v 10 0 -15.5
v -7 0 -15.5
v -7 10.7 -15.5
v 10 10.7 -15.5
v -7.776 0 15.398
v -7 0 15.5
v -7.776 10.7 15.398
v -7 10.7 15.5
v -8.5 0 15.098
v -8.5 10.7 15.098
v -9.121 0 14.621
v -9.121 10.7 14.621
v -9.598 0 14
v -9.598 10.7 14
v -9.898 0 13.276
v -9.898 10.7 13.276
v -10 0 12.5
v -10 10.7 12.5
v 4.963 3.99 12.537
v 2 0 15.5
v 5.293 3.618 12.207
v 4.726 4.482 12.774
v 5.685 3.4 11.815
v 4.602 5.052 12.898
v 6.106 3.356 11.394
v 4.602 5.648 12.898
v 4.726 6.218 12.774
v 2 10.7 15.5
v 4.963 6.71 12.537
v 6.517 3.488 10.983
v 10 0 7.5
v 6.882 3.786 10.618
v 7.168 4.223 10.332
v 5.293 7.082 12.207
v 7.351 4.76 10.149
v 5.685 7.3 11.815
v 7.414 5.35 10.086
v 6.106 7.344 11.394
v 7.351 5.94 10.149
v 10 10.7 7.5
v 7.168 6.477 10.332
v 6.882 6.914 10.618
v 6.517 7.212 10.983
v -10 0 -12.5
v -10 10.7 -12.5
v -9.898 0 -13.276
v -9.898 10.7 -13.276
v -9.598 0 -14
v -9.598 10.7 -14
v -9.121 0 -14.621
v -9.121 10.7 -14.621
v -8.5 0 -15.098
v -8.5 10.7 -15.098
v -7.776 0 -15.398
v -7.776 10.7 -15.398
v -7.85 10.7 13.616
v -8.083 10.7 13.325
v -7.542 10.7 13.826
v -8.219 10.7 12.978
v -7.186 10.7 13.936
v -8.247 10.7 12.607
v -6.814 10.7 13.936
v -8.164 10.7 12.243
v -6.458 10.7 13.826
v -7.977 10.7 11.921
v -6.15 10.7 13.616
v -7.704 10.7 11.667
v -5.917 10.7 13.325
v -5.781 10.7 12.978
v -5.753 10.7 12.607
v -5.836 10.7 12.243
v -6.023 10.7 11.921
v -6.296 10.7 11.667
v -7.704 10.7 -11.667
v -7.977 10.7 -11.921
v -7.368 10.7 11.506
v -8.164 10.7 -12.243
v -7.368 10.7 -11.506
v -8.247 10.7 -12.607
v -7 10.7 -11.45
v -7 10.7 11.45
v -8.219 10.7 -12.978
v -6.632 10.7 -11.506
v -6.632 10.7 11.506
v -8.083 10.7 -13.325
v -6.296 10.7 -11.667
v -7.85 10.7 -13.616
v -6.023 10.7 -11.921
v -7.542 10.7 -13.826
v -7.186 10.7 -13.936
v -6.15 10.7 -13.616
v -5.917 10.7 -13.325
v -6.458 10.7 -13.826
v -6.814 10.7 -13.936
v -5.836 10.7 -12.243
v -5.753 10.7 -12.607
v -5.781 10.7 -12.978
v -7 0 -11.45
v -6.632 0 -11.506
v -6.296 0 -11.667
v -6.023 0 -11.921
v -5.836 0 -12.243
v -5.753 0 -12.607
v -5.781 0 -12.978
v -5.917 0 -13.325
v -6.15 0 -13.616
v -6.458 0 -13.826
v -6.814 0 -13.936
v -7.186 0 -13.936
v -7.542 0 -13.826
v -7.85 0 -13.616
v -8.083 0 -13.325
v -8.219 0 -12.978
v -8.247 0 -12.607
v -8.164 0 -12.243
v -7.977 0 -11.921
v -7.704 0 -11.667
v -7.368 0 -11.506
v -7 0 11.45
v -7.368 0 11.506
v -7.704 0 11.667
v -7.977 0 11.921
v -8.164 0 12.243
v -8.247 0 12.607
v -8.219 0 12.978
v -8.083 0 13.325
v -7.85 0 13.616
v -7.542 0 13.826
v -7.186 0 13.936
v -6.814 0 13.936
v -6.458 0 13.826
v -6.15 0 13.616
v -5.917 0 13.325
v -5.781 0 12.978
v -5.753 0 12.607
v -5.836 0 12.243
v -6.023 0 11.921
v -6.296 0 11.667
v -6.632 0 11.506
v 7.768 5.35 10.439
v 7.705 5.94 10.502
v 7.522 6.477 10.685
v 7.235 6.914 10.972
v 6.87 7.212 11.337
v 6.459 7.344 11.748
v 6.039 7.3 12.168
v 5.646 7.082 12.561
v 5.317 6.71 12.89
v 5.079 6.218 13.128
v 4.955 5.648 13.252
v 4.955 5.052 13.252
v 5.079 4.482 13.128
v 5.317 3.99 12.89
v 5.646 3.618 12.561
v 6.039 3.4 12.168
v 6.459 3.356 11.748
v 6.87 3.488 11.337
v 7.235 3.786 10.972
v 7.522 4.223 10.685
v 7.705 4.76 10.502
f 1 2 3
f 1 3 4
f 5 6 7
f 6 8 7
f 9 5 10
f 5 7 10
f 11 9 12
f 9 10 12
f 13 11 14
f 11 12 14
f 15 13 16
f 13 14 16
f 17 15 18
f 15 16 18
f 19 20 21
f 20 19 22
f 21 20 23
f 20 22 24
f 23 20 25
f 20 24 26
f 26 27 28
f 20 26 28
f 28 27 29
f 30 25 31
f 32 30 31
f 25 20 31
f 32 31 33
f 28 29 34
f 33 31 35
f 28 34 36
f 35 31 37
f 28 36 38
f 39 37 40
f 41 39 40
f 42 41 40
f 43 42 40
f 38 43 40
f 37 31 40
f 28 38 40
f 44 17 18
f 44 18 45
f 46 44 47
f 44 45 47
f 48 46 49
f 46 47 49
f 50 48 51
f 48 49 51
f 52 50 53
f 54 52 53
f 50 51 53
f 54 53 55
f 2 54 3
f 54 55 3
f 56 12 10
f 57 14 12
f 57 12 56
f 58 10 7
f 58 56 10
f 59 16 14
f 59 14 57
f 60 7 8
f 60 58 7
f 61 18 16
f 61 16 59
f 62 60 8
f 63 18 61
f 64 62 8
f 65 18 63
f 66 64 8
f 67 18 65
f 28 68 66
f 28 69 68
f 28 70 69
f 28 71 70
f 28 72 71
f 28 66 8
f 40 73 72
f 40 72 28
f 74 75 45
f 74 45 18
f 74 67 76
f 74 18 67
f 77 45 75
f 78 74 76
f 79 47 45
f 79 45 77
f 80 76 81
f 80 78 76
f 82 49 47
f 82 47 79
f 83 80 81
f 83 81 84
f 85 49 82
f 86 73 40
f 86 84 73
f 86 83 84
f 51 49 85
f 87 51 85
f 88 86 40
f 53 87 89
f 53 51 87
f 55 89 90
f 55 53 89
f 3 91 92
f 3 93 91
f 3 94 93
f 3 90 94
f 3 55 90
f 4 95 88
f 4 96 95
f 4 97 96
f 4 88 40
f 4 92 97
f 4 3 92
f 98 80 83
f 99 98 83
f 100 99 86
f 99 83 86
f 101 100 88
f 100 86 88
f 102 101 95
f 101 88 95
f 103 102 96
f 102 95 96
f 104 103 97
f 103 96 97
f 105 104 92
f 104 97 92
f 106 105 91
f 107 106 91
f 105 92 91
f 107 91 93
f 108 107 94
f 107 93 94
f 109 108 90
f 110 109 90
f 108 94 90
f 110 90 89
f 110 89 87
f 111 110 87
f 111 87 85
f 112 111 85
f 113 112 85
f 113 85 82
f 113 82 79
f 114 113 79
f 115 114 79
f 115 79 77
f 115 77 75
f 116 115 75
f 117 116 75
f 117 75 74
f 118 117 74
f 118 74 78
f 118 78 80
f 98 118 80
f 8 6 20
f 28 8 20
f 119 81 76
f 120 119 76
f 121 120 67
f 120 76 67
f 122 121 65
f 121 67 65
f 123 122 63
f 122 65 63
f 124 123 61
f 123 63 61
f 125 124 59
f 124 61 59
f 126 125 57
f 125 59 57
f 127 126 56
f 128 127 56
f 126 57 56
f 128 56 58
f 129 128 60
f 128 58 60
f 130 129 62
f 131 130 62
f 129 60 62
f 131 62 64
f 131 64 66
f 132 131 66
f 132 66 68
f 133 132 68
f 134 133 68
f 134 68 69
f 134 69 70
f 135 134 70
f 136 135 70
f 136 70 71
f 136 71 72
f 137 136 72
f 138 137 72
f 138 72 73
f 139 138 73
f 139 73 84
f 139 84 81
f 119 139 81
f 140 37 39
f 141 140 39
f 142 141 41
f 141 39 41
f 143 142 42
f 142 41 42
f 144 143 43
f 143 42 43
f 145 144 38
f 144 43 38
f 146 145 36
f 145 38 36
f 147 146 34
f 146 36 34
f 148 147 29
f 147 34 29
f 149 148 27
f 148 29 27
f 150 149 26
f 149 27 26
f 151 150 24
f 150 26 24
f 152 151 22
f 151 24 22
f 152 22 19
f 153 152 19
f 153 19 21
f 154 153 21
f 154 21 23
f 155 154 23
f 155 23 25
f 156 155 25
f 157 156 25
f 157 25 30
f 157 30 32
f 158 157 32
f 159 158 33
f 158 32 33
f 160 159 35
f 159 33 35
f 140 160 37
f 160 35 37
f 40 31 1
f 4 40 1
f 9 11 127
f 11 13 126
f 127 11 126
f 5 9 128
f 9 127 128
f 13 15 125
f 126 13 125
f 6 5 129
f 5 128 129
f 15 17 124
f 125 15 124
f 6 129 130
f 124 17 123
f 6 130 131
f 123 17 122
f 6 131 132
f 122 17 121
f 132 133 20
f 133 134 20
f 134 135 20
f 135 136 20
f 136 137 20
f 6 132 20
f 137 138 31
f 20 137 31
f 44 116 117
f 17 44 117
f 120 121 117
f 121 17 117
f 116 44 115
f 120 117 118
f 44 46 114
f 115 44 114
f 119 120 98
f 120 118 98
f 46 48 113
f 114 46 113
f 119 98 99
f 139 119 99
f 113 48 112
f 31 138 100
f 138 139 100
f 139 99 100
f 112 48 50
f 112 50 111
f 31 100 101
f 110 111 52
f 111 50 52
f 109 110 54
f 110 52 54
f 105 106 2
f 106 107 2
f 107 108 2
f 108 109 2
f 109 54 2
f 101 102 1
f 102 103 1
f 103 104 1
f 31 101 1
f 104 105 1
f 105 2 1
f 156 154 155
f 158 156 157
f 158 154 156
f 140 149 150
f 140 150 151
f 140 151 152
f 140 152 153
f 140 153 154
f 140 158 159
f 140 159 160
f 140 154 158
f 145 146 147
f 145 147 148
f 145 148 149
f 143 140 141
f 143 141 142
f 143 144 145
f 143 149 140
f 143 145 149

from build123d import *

# Parameters (mm, degrees)
SKETCH_1_W          = 20
SKETCH_1_H          = 31
EXTRUDE_1_DEPTH     = 10.7
SKETCH_2_R          = 1.25
CUT_EXTRUDE_1_DEPTH = 40.7
CHAMFER_1_SIZE      = 8
SKETCH_3_R          = 2
EXTRUDE_2_DEPTH     = 0.5
FILLET_1_R          = 3


with BuildPart() as part:
    # 草图1 → 凸台-拉伸1 (new body)
    with BuildSketch(Plane(origin=(0, 0, 0), x_dir=(1, 0, 0), z_dir=(0, 1, 0))):
        Rectangle(SKETCH_1_W, SKETCH_1_H)
    extrude(amount=EXTRUDE_1_DEPTH)

    # 草图2 → 切除-拉伸1 (cut)
    with BuildSketch(Plane(origin=(0, 10.7, 0), x_dir=(1, 0, 0), z_dir=(0, 1, 0))):
        with Locations(Location((-7, 12.7, 0), (0, 0, 270))):
            Circle(SKETCH_2_R)
        with Locations(Location((-7, -12.7, 0), (0, 0, 90))):
            Circle(SKETCH_2_R)
    extrude(amount=-CUT_EXTRUDE_1_DEPTH, mode=Mode.SUBTRACT)

    # 倒角1
    chamfer_1_edges = [part.edges().sort_by_distance(p)[0] for p in [
        (10, 5.35, 15.5),
    ]]
    chamfer(chamfer_1_edges, length=CHAMFER_1_SIZE)

    # 草图3 → 凸台-拉伸2 (add)
    with BuildSketch(Plane(origin=(8.75, 0, 8.75), x_dir=(0.7071067811865485, 0, -0.7071067811865466), z_dir=(0.7071067811865466, 0, 0.7071067811865485))):
        with Locations((-3.889087297, 5.35)):
            Circle(SKETCH_3_R)
    extrude(amount=EXTRUDE_2_DEPTH)

    # 圆角1
    fillet_1_edges = [part.edges().sort_by_distance(p)[0] for p in [
        (-10, 5.35, -15.5),
        (-10, 5.35, 15.5),
    ]]
    fillet(fillet_1_edges, radius=FILLET_1_R)


solid = part.part
